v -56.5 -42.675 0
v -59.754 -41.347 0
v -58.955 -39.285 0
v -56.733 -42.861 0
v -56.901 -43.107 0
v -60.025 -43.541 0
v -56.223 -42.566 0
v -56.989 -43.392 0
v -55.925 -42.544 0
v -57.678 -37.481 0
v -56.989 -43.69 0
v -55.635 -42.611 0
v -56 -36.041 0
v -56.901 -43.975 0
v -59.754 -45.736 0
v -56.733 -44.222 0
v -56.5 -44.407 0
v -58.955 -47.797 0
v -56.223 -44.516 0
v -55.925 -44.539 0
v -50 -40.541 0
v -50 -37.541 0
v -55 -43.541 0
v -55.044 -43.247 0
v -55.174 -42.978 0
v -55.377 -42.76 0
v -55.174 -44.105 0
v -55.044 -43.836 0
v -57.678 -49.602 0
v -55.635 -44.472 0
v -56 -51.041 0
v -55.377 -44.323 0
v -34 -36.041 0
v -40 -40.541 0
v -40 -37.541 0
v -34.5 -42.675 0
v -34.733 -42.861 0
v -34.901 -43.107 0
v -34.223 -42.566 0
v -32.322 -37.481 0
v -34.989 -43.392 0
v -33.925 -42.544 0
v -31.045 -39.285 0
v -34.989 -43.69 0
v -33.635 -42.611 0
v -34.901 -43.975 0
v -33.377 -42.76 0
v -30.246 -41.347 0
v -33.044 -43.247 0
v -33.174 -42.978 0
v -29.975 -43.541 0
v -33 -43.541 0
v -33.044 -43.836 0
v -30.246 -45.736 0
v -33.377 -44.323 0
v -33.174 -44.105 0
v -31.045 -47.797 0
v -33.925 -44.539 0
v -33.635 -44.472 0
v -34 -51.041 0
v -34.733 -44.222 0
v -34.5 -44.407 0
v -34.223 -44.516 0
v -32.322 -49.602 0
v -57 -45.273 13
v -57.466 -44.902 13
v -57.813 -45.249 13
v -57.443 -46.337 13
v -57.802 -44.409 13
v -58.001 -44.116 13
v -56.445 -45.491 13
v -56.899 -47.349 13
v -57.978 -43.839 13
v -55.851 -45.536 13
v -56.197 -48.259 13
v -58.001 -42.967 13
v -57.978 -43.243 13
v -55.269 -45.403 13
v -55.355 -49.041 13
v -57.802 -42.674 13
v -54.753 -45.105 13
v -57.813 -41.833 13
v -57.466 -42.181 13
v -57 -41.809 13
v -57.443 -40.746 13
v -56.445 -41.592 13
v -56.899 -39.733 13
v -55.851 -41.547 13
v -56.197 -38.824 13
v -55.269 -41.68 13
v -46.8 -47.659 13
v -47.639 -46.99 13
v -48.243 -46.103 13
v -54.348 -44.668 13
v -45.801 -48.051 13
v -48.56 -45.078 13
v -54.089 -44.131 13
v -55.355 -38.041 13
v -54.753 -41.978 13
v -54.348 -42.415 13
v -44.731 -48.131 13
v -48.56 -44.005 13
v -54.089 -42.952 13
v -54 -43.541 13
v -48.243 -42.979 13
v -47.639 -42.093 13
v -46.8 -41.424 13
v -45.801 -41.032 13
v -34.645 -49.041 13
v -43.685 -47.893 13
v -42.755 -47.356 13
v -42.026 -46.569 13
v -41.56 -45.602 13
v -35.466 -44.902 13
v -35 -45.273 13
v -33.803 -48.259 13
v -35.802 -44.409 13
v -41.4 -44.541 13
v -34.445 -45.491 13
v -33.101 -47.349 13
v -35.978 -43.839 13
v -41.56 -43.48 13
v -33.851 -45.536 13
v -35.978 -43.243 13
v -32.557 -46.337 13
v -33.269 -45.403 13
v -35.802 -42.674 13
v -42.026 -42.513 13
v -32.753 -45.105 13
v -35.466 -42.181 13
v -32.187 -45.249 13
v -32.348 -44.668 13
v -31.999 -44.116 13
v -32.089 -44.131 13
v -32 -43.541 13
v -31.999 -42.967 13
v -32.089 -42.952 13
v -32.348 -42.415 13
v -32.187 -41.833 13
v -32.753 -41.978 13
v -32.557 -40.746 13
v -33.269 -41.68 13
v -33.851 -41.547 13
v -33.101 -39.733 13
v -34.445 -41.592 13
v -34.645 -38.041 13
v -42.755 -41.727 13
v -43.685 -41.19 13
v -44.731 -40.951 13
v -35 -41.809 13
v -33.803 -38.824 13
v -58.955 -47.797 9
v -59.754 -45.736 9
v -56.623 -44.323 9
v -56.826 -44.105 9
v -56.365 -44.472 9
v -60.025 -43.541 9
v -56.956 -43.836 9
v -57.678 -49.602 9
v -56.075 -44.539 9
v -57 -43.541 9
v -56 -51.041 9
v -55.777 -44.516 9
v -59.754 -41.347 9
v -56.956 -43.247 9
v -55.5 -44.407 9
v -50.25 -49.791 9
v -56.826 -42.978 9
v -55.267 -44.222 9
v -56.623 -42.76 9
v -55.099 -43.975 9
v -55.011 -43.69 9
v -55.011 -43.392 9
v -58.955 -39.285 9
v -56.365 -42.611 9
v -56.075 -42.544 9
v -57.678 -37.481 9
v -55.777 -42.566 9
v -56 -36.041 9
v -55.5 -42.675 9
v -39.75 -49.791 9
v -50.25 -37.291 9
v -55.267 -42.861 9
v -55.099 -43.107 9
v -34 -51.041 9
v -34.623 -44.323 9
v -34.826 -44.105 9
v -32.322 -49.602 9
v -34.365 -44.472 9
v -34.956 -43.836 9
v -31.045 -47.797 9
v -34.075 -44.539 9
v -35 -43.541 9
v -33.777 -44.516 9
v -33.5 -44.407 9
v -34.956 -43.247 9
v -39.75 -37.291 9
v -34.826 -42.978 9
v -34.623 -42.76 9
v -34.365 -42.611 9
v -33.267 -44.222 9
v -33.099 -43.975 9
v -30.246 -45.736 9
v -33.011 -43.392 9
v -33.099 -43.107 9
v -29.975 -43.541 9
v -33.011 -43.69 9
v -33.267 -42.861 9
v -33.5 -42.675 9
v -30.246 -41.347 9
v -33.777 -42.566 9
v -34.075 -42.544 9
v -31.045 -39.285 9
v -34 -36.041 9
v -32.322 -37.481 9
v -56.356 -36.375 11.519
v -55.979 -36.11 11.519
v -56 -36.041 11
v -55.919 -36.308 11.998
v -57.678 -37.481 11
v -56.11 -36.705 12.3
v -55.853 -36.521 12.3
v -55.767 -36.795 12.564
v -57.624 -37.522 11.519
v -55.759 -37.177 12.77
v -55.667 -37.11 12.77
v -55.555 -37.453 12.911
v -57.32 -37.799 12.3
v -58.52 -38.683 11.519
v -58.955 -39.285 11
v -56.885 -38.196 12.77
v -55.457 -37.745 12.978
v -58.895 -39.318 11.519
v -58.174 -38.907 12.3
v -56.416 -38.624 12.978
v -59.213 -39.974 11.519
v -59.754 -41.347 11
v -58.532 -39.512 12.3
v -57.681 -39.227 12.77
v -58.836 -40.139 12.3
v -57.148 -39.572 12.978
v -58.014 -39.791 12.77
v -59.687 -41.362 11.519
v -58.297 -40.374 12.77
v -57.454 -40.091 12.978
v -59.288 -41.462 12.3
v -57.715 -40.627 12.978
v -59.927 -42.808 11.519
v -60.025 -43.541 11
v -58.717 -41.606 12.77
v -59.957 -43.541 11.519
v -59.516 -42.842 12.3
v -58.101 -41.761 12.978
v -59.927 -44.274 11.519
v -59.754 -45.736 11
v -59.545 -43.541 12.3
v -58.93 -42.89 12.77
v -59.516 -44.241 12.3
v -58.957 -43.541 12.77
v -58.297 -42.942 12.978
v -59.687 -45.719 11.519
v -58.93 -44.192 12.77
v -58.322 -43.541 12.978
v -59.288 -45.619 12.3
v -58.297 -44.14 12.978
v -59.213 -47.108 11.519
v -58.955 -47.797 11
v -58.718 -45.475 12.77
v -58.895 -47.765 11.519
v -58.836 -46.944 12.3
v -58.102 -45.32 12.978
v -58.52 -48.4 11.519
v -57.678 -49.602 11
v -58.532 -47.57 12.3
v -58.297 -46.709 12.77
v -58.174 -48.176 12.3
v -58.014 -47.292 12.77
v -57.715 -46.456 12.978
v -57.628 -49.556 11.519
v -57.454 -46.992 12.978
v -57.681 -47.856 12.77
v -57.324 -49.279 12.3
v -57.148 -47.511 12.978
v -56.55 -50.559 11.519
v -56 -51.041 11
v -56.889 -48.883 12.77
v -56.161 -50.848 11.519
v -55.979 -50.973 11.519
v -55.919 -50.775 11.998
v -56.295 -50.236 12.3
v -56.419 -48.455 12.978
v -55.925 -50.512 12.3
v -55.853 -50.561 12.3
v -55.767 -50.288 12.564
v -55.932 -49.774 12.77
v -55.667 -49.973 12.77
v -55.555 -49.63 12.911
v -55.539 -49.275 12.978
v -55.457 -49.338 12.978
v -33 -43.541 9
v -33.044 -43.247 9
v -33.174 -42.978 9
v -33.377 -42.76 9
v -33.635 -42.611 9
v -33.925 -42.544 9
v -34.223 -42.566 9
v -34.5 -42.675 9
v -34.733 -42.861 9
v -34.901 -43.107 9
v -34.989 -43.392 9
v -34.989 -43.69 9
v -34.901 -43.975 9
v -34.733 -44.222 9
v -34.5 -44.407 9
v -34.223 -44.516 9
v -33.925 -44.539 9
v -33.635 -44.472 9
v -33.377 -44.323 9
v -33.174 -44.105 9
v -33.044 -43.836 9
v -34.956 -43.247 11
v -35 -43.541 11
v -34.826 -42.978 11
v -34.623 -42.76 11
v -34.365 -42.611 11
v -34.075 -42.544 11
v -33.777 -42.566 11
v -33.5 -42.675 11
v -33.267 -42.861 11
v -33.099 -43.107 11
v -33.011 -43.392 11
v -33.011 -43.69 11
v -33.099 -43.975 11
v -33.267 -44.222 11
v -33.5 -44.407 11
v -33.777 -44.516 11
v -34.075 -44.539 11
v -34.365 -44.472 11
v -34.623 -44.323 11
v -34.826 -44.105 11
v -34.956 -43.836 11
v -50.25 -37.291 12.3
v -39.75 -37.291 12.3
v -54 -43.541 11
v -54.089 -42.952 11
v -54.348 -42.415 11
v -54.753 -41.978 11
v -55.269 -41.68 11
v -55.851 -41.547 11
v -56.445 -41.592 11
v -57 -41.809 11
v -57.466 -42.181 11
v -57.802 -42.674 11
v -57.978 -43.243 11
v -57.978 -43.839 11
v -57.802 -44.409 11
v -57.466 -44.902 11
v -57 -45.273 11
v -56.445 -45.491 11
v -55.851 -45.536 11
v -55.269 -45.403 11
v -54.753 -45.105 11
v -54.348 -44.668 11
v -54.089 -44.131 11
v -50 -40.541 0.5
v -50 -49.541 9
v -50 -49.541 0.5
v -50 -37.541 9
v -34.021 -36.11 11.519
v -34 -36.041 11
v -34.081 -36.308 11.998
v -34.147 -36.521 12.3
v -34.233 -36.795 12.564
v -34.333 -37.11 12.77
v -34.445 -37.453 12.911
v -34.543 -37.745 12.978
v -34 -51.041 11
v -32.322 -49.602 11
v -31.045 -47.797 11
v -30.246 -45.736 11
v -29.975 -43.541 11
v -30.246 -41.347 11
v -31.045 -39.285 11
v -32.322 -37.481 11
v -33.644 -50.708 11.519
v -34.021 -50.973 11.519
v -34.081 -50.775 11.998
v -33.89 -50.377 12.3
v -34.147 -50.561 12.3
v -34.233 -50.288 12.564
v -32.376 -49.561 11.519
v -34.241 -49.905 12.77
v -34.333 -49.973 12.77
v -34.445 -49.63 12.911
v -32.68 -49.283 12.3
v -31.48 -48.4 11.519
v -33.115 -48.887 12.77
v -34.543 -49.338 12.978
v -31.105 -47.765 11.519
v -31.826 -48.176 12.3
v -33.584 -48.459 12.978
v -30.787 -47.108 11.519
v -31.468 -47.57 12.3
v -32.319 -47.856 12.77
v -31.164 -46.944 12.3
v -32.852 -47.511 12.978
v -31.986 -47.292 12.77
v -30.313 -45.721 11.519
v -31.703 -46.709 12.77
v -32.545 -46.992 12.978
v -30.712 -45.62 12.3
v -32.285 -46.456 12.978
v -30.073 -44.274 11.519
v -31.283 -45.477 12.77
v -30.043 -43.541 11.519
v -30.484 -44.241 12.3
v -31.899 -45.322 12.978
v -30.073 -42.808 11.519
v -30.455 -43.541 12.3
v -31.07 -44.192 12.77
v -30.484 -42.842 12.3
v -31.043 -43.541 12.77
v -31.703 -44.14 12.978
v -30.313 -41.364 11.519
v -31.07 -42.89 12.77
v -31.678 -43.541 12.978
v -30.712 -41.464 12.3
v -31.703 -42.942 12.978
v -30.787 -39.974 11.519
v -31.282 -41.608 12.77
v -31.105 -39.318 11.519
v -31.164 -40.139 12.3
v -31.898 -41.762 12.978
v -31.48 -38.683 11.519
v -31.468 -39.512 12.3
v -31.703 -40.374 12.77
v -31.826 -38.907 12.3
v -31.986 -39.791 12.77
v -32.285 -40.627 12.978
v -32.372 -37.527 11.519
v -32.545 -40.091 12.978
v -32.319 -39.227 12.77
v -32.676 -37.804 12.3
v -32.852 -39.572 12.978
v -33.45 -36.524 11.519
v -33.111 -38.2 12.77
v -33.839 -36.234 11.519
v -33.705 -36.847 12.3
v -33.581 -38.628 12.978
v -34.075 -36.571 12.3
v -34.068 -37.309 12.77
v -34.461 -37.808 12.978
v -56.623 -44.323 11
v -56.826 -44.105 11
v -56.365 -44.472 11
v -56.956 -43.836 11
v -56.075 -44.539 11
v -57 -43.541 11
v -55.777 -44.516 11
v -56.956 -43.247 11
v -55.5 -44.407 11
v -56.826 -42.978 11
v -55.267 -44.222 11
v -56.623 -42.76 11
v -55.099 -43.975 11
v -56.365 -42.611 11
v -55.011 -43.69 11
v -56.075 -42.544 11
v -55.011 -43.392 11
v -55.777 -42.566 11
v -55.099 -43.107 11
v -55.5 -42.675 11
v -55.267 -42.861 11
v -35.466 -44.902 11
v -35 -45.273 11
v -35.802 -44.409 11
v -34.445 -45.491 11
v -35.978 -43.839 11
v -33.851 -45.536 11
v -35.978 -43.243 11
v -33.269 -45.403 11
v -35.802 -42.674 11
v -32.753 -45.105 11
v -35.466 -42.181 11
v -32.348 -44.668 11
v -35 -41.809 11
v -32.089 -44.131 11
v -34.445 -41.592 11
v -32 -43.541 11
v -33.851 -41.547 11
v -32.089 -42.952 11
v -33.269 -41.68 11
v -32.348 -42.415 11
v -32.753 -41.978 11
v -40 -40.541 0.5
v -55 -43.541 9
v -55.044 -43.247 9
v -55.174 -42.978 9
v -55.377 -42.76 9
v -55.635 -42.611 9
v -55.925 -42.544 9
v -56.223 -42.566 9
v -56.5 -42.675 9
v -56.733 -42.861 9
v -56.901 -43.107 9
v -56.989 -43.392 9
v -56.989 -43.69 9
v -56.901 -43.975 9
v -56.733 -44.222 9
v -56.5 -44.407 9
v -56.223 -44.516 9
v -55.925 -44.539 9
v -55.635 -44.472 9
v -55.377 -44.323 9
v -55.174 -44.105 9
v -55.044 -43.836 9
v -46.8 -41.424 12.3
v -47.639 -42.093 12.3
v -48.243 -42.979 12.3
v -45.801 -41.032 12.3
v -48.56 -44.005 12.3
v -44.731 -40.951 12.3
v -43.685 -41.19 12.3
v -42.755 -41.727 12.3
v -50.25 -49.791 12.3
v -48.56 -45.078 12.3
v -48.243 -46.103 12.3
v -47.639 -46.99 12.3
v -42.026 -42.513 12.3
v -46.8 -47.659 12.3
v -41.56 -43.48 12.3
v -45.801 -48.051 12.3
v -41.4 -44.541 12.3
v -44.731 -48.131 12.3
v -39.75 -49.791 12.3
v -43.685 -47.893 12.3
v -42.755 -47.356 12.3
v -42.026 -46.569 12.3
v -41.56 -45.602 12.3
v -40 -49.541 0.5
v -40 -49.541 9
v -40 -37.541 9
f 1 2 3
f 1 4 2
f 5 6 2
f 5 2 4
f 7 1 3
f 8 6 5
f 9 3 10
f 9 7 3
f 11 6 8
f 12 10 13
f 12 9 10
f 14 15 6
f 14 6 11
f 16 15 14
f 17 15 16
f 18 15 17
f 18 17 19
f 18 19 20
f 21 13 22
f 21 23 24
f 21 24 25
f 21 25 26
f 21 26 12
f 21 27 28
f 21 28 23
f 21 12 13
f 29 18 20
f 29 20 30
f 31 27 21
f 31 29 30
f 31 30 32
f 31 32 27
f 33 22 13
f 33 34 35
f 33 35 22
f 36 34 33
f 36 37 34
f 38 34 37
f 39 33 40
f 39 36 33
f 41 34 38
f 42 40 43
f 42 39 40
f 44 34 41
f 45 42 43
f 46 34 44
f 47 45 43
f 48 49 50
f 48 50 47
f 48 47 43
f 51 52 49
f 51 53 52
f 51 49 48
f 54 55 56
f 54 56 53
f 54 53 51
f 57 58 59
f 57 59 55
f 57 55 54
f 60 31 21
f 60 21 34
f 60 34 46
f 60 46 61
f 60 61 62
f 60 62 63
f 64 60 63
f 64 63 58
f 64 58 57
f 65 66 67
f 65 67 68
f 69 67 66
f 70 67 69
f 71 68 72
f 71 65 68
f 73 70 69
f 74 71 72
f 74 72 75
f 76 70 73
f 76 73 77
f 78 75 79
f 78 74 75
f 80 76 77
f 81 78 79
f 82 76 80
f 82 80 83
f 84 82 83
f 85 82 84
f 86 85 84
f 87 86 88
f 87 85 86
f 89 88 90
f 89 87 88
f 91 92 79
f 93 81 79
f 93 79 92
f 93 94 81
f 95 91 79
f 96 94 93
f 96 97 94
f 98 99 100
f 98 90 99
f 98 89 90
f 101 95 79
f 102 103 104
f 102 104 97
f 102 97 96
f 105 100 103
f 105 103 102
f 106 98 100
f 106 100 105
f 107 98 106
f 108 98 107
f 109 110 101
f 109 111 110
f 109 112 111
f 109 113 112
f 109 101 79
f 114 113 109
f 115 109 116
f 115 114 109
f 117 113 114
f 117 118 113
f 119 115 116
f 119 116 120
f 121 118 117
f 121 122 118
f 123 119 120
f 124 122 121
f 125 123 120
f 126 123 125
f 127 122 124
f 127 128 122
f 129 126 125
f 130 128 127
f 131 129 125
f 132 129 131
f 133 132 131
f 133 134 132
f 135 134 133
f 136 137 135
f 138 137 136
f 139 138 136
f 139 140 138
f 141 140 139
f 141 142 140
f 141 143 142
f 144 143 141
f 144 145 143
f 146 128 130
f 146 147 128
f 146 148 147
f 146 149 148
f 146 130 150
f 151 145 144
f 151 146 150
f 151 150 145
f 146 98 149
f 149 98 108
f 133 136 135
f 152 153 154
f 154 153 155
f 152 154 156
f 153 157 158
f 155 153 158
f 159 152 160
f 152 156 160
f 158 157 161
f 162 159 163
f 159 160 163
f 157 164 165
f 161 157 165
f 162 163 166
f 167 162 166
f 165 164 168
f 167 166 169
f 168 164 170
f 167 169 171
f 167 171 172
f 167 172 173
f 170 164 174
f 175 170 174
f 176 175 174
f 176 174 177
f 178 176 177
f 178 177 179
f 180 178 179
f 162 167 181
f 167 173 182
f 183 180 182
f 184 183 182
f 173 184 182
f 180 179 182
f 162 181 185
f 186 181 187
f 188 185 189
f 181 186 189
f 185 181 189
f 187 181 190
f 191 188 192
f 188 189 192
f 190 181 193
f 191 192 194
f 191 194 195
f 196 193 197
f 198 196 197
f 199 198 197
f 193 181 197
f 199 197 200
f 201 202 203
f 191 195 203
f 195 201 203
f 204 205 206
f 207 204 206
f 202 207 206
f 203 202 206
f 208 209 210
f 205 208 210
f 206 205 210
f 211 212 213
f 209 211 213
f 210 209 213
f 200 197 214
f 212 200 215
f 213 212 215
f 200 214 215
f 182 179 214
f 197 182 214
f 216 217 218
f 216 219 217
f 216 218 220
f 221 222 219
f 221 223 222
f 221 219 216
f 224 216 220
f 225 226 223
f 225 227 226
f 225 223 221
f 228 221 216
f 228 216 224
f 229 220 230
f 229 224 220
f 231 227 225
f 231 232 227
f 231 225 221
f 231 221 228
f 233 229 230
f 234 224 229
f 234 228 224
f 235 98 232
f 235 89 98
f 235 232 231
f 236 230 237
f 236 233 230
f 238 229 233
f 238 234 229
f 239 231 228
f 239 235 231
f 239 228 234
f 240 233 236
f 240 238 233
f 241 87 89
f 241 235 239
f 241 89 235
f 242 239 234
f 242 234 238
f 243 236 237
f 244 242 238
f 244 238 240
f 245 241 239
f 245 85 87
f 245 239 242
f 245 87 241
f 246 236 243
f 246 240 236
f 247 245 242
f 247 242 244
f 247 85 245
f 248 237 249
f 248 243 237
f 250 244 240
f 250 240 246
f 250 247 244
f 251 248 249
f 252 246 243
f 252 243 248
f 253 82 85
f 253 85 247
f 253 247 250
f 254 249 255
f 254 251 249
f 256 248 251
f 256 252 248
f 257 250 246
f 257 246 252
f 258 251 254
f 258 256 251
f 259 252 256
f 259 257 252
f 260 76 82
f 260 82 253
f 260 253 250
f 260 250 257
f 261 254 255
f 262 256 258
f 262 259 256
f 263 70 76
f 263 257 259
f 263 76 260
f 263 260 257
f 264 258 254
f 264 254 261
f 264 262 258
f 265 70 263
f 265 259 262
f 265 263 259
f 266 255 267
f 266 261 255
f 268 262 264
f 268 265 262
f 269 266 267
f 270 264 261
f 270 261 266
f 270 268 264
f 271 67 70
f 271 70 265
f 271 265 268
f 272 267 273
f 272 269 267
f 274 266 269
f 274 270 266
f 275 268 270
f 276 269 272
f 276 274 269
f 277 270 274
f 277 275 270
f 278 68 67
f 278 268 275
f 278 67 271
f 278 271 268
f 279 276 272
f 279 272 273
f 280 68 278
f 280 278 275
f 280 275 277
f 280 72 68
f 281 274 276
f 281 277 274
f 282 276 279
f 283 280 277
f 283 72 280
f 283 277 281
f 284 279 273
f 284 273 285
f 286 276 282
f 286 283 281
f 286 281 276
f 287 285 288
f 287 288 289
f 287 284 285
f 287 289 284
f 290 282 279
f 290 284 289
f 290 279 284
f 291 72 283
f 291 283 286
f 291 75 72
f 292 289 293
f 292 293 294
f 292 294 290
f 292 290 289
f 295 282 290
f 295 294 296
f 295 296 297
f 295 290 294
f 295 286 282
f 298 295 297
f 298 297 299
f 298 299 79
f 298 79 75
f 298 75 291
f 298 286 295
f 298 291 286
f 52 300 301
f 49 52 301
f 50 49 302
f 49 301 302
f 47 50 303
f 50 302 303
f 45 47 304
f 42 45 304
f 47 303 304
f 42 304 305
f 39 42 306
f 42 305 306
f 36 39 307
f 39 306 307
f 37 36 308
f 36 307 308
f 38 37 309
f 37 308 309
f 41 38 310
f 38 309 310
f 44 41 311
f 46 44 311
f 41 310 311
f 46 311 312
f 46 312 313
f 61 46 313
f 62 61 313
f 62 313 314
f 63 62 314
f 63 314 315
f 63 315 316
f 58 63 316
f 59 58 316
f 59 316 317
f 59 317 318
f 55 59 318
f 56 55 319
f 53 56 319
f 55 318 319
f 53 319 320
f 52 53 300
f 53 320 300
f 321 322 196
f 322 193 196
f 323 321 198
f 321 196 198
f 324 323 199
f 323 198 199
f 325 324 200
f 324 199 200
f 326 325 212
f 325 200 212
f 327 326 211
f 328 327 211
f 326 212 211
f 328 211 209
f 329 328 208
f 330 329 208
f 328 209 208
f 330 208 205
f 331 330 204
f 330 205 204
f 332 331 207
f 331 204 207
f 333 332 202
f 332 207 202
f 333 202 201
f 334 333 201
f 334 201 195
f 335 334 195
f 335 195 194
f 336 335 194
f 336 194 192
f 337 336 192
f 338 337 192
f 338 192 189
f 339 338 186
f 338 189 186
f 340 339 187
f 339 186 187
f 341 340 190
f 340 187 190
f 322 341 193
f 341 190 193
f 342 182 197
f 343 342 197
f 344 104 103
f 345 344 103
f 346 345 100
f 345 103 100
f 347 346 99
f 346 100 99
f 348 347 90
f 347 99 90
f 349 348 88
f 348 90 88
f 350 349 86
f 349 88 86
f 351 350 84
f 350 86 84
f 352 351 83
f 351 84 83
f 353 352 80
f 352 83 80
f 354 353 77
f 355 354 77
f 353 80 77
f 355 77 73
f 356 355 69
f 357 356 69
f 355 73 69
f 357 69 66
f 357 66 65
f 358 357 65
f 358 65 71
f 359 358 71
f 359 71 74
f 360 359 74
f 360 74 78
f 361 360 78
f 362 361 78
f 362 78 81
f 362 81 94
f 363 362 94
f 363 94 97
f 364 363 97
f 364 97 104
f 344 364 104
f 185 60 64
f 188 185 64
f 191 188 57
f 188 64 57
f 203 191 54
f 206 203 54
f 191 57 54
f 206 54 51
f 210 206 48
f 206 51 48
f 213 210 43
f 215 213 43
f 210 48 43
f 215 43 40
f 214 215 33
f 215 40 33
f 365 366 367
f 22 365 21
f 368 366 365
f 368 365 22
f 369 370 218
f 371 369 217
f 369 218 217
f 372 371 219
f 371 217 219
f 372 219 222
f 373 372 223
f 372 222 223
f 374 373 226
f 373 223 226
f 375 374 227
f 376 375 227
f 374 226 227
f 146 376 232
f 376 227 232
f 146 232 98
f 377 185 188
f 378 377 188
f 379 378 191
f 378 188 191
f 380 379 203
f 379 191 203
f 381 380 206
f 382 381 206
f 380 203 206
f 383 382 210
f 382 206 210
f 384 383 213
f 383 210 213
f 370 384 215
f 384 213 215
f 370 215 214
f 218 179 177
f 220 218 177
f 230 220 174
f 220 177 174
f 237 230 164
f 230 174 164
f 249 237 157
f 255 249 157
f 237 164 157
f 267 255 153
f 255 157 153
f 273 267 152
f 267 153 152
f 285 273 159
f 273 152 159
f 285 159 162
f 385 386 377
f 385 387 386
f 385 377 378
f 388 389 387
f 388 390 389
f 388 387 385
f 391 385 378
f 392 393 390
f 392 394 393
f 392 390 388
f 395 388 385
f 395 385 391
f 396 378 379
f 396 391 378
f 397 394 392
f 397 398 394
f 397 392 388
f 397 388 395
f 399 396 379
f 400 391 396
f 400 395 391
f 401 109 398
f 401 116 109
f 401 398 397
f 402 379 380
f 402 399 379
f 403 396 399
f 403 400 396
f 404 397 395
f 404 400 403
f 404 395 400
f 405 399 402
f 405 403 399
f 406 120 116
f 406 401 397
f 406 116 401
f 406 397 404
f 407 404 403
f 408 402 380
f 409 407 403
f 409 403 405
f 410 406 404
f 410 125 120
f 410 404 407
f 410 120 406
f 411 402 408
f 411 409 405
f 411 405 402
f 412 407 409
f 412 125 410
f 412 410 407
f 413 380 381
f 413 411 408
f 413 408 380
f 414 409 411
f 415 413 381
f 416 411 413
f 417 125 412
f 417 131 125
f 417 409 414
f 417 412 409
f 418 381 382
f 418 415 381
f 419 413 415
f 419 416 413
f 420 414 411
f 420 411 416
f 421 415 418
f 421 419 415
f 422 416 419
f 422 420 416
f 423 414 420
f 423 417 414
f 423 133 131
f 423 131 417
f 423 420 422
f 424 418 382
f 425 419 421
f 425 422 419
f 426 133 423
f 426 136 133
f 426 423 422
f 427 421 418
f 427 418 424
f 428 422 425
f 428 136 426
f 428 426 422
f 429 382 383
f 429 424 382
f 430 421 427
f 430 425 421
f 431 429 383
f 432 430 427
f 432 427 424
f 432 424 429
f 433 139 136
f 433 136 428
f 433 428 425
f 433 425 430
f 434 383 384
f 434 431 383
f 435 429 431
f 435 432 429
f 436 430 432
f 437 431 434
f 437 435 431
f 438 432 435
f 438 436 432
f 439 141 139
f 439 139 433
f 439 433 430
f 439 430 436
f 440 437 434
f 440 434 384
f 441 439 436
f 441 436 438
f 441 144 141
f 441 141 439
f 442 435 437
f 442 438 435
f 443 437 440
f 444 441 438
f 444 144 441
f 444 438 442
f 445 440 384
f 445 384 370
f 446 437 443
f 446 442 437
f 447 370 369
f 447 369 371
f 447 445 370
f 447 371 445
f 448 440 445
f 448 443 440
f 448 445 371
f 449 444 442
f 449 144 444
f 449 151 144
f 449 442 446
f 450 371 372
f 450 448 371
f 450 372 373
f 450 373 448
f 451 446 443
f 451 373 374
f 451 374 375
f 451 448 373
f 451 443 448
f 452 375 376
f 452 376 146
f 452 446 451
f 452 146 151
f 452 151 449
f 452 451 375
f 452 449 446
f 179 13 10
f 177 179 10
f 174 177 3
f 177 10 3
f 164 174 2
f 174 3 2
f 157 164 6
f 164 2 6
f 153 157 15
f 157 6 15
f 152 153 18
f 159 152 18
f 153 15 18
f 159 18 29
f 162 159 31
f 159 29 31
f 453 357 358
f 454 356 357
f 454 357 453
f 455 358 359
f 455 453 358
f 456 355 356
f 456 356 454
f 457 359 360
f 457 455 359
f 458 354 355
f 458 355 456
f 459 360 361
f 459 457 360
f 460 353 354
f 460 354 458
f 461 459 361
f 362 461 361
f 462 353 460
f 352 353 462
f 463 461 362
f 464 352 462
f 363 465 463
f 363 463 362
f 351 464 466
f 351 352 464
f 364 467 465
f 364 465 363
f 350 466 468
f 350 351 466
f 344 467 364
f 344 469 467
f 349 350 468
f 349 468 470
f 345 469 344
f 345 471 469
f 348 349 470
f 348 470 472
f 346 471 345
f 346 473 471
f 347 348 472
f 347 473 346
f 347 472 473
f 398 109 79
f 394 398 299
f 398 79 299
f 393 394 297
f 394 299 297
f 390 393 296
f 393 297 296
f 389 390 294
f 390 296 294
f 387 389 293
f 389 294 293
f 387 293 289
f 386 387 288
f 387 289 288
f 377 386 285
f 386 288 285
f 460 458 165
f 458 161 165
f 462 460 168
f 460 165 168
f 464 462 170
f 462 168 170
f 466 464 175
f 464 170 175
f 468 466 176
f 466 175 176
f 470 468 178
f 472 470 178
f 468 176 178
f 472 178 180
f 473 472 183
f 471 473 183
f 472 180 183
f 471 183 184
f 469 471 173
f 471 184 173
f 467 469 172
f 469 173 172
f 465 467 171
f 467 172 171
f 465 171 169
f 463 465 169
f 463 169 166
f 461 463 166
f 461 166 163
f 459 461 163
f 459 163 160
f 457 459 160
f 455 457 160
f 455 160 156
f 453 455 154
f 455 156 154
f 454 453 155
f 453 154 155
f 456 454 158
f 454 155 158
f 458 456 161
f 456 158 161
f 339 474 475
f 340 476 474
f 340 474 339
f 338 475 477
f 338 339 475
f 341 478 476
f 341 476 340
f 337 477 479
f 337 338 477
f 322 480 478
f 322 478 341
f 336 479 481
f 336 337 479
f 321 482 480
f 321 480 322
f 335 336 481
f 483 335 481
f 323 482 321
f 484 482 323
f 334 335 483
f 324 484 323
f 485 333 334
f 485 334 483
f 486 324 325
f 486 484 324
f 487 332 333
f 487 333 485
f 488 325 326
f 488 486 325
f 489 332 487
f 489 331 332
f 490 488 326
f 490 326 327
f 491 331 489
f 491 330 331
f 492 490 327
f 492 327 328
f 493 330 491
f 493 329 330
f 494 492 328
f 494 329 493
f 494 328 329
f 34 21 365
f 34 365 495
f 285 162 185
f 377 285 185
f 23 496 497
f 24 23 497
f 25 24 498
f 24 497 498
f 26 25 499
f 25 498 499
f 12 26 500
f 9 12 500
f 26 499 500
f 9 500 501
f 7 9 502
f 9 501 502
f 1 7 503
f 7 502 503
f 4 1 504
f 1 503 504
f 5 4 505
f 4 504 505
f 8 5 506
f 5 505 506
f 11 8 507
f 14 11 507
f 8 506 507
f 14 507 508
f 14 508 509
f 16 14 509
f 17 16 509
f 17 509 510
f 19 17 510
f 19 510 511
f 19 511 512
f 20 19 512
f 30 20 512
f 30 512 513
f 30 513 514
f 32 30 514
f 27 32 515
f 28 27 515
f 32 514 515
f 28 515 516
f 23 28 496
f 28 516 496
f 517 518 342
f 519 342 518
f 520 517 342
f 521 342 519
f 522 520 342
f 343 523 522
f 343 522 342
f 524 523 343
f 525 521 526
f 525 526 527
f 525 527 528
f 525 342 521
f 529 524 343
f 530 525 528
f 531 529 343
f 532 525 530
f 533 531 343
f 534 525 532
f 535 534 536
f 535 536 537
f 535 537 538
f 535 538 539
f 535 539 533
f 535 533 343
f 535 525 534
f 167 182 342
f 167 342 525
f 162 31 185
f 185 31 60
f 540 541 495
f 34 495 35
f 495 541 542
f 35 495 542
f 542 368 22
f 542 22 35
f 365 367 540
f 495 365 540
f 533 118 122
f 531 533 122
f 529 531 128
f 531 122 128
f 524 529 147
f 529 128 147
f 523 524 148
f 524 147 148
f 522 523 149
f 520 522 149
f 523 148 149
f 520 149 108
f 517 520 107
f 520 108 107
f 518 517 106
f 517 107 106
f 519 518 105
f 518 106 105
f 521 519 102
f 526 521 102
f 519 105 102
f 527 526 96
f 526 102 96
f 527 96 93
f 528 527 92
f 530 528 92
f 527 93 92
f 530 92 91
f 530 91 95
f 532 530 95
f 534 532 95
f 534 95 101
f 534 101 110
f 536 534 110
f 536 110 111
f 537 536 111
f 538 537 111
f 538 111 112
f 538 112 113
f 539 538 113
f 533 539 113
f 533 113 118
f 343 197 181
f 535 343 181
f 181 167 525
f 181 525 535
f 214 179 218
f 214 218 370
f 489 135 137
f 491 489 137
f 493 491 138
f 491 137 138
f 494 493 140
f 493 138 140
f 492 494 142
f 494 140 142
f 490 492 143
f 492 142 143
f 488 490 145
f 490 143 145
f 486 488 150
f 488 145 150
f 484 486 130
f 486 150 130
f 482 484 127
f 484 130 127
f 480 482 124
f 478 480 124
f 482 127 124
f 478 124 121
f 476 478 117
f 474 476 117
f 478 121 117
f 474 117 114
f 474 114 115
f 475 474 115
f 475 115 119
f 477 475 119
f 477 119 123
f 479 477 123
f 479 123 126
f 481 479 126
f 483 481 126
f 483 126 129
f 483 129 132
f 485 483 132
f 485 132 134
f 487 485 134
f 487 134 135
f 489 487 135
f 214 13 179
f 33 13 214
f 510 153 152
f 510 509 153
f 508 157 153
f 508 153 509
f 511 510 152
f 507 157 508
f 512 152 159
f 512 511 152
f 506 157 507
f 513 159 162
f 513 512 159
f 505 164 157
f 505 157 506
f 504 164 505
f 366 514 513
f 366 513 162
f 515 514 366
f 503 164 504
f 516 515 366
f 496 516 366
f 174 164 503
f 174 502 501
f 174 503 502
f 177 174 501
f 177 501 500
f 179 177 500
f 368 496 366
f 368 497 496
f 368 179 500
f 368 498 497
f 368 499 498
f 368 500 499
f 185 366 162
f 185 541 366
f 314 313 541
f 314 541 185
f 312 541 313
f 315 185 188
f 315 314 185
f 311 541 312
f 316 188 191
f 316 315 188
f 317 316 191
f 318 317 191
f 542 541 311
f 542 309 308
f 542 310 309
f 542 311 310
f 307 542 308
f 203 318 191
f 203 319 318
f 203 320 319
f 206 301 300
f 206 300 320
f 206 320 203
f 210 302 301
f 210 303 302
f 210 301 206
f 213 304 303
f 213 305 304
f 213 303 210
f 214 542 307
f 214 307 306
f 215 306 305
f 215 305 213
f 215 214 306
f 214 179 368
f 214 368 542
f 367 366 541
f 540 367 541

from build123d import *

# Parameters (mm, degrees)
F0_W            = 22
F0_H            = 15
F1_DEPTH        = 9
F2_R            = 1
F2_W            = 10
F2_H            = 12
F3_DEPTH        = 9
F4_W            = 10
F4_H            = 9
F5_DEPTH        = 0.5
F6_W            = 22
F6_H            = 15
F7_DEPTH        = 4
F8_R            = 3.6
F9_DEPTH        = 4
F10_T1_DEPTH    = 32
F10_T4_ANGLE    = 176.5875970816
F10_T6_ANGLE    = 176.5875970816
F11_D           = 2
F11_DEPTH       = 20
F11_CBORE_D     = 4
F11_CBORE_DEPTH = 2
F11_TIP         = 0.600860619
F12_W           = 10.5
F12_H           = 12.5
F13_DEPTH       = 3.3


# Not quite as in the source:
# - a fillet or chamfer that OpenCascade refuses, or shapes differently, is made with other operations: its cross-section is extruded or revolved along the edge and cut away or added


with BuildPart() as f1:
    # F0 (on Top) → F1 (new body)
    with BuildSketch(Plane.XY):
        with Locations((-45, -43.5413755476)):
            Rectangle(F0_W, F0_H)
        with BuildLine():
            ThreePointArc((-34, -51.0413755476), (-29.9749371855, -43.5413755476), (-34, -36.0413755476))
            Line((-34, -36.0413755476), (-34, -51.0413755476))
        make_face()
        with BuildLine():
            Line((-56, -51.0413755476), (-56, -36.0413755476))
            ThreePointArc((-56, -36.0413755476), (-60.0250628145, -43.5413755476), (-56, -51.0413755476))
        make_face()
    extrude(amount=F1_DEPTH)

    # F2 (on face) → F3 (cut)
    with BuildSketch(Plane.XY.offset(9)):
        with Locations((-56, -43.5413755476)):
            Circle(F2_R)
        with Locations((-34, -43.5413755476)):
            Circle(F2_R)
        with Locations((-45, -43.5413755476)):
            Rectangle(F2_W, F2_H)
    extrude(amount=-F3_DEPTH, mode=Mode.SUBTRACT)

    # F4 (on face) → F5 (join)
    with BuildSketch(Plane(origin=(0, 0, 0), x_dir=(1, 0, 0), z_dir=(0, 0, -1))):
        with Locations((-45, 45.0413755476)):
            Rectangle(F4_W, F4_H)
    extrude(amount=-F5_DEPTH)


with BuildPart() as f7:
    # F6 (on face) → F7 (new body)
    with BuildSketch(Plane.XY.offset(9)):
        with Locations((-45, -43.5413755476)):
            Rectangle(F6_W, F6_H)
        with BuildLine():
            ThreePointArc((-34, -51.0413755476), (-29.9749371855, -43.5413755476), (-34, -36.0413755476))
            Line((-34, -36.0413755476), (-34, -51.0413755476))
        make_face()
        with BuildLine():
            Line((-56, -51.0413755476), (-56, -36.0413755476))
            ThreePointArc((-56, -36.0413755476), (-60.0250628145, -43.5413755476), (-56, -51.0413755476))
        make_face()
    extrude(amount=F7_DEPTH)

    # F8 (on face) → F9 (cut)
    with BuildSketch(Plane.XY.offset(13)):
        with Locations((-45, -44.5413755476)):
            Circle(F8_R)
    extrude(amount=-F9_DEPTH, mode=Mode.SUBTRACT)

    # F10: fillet of radius 2 on 4 edges, made by hand

    # F10_s2 → F10_t1 (cut)
    with BuildSketch(Plane.YZ.offset(-61)):
        with BuildLine():
            ThreePointArc((-36.0413755476, 11), (-36.6271619853, 12.4142135624), (-38.0413755476, 13))
            Line((-38.0413755476, 13), (-36.0413755476, 13))
            Line((-36.0413755476, 13), (-36.0413755476, 11))
        make_face()
        with BuildLine():
            ThreePointArc((-49.0413755476, 13), (-50.45558911, 12.4142135624), (-51.0413755476, 11))
            Line((-51.0413755476, 11), (-51.0413755476, 13))
            Line((-51.0413755476, 13), (-49.0413755476, 13))
        make_face()
    extrude(amount=F10_T1_DEPTH, mode=Mode.SUBTRACT)

    # F10_s3 → F10_t4 (revolve, cut)
    with BuildSketch(Plane(origin=(-40.2362302043, -1.1985422881, 0), x_dir=(0, 0, 1), z_dir=(-0.9995566433, -0.0297744322, 0))):
        with BuildLine():
            ThreePointArc((11, -51.3616145647), (12.4142135624, -50.7758281271), (13, -49.3616145647))
            Line((13, -49.3616145647), (13, -51.3616145647))
            Line((13, -51.3616145647), (11, -51.3616145647))
        make_face()
    revolve(axis=Axis((-38.9749371855, -43.5413755476, 13), (0, 0, 1)), revolution_arc=F10_T4_ANGLE, mode=Mode.SUBTRACT)

    # F10_s5 → F10_t6 (revolve, cut)
    with BuildSketch(Plane(origin=(-52.2756731943, -1.557168866, 0), x_dir=(0, 0, 1), z_dir=(0.9995566433, 0.0297744322, 0))):
        with BuildLine():
            ThreePointArc((11, 33.0028289167), (12.4142135624, 33.5886153543), (13, 35.0028289167))
            Line((13, 35.0028289167), (13, 33.0028289167))
            Line((13, 33.0028289167), (11, 33.0028289167))
        make_face()
    revolve(axis=Axis((-51.0250628145, -43.5413755476, 13), (0, 0, 1)), revolution_arc=F10_T6_ANGLE, mode=Mode.SUBTRACT)

    # F11
    with Locations(Plane.XY.offset(13)):
        with Locations((-34, -43.5413755476), (-56, -43.5413755476)):
            CounterBoreHole(F11_D / 2, F11_CBORE_D / 2, F11_CBORE_DEPTH, depth=F11_DEPTH)
            with Locations((0, 0, -(F11_DEPTH + F11_TIP / 2))):  # 118° drill point
                Cone(0, F11_D / 2, F11_TIP, mode=Mode.SUBTRACT)

    # F12 (on face) → F13 (cut)
    with BuildSketch(Plane(origin=(0, 0, 9), x_dir=(1, 0, 0), z_dir=(0, 0, -1))):
        with Locations((-45, 43.5413755476)):
            Rectangle(F12_W, F12_H)
    extrude(amount=-F13_DEPTH, mode=Mode.SUBTRACT)


solid = Compound([f1.part, f7.part])
